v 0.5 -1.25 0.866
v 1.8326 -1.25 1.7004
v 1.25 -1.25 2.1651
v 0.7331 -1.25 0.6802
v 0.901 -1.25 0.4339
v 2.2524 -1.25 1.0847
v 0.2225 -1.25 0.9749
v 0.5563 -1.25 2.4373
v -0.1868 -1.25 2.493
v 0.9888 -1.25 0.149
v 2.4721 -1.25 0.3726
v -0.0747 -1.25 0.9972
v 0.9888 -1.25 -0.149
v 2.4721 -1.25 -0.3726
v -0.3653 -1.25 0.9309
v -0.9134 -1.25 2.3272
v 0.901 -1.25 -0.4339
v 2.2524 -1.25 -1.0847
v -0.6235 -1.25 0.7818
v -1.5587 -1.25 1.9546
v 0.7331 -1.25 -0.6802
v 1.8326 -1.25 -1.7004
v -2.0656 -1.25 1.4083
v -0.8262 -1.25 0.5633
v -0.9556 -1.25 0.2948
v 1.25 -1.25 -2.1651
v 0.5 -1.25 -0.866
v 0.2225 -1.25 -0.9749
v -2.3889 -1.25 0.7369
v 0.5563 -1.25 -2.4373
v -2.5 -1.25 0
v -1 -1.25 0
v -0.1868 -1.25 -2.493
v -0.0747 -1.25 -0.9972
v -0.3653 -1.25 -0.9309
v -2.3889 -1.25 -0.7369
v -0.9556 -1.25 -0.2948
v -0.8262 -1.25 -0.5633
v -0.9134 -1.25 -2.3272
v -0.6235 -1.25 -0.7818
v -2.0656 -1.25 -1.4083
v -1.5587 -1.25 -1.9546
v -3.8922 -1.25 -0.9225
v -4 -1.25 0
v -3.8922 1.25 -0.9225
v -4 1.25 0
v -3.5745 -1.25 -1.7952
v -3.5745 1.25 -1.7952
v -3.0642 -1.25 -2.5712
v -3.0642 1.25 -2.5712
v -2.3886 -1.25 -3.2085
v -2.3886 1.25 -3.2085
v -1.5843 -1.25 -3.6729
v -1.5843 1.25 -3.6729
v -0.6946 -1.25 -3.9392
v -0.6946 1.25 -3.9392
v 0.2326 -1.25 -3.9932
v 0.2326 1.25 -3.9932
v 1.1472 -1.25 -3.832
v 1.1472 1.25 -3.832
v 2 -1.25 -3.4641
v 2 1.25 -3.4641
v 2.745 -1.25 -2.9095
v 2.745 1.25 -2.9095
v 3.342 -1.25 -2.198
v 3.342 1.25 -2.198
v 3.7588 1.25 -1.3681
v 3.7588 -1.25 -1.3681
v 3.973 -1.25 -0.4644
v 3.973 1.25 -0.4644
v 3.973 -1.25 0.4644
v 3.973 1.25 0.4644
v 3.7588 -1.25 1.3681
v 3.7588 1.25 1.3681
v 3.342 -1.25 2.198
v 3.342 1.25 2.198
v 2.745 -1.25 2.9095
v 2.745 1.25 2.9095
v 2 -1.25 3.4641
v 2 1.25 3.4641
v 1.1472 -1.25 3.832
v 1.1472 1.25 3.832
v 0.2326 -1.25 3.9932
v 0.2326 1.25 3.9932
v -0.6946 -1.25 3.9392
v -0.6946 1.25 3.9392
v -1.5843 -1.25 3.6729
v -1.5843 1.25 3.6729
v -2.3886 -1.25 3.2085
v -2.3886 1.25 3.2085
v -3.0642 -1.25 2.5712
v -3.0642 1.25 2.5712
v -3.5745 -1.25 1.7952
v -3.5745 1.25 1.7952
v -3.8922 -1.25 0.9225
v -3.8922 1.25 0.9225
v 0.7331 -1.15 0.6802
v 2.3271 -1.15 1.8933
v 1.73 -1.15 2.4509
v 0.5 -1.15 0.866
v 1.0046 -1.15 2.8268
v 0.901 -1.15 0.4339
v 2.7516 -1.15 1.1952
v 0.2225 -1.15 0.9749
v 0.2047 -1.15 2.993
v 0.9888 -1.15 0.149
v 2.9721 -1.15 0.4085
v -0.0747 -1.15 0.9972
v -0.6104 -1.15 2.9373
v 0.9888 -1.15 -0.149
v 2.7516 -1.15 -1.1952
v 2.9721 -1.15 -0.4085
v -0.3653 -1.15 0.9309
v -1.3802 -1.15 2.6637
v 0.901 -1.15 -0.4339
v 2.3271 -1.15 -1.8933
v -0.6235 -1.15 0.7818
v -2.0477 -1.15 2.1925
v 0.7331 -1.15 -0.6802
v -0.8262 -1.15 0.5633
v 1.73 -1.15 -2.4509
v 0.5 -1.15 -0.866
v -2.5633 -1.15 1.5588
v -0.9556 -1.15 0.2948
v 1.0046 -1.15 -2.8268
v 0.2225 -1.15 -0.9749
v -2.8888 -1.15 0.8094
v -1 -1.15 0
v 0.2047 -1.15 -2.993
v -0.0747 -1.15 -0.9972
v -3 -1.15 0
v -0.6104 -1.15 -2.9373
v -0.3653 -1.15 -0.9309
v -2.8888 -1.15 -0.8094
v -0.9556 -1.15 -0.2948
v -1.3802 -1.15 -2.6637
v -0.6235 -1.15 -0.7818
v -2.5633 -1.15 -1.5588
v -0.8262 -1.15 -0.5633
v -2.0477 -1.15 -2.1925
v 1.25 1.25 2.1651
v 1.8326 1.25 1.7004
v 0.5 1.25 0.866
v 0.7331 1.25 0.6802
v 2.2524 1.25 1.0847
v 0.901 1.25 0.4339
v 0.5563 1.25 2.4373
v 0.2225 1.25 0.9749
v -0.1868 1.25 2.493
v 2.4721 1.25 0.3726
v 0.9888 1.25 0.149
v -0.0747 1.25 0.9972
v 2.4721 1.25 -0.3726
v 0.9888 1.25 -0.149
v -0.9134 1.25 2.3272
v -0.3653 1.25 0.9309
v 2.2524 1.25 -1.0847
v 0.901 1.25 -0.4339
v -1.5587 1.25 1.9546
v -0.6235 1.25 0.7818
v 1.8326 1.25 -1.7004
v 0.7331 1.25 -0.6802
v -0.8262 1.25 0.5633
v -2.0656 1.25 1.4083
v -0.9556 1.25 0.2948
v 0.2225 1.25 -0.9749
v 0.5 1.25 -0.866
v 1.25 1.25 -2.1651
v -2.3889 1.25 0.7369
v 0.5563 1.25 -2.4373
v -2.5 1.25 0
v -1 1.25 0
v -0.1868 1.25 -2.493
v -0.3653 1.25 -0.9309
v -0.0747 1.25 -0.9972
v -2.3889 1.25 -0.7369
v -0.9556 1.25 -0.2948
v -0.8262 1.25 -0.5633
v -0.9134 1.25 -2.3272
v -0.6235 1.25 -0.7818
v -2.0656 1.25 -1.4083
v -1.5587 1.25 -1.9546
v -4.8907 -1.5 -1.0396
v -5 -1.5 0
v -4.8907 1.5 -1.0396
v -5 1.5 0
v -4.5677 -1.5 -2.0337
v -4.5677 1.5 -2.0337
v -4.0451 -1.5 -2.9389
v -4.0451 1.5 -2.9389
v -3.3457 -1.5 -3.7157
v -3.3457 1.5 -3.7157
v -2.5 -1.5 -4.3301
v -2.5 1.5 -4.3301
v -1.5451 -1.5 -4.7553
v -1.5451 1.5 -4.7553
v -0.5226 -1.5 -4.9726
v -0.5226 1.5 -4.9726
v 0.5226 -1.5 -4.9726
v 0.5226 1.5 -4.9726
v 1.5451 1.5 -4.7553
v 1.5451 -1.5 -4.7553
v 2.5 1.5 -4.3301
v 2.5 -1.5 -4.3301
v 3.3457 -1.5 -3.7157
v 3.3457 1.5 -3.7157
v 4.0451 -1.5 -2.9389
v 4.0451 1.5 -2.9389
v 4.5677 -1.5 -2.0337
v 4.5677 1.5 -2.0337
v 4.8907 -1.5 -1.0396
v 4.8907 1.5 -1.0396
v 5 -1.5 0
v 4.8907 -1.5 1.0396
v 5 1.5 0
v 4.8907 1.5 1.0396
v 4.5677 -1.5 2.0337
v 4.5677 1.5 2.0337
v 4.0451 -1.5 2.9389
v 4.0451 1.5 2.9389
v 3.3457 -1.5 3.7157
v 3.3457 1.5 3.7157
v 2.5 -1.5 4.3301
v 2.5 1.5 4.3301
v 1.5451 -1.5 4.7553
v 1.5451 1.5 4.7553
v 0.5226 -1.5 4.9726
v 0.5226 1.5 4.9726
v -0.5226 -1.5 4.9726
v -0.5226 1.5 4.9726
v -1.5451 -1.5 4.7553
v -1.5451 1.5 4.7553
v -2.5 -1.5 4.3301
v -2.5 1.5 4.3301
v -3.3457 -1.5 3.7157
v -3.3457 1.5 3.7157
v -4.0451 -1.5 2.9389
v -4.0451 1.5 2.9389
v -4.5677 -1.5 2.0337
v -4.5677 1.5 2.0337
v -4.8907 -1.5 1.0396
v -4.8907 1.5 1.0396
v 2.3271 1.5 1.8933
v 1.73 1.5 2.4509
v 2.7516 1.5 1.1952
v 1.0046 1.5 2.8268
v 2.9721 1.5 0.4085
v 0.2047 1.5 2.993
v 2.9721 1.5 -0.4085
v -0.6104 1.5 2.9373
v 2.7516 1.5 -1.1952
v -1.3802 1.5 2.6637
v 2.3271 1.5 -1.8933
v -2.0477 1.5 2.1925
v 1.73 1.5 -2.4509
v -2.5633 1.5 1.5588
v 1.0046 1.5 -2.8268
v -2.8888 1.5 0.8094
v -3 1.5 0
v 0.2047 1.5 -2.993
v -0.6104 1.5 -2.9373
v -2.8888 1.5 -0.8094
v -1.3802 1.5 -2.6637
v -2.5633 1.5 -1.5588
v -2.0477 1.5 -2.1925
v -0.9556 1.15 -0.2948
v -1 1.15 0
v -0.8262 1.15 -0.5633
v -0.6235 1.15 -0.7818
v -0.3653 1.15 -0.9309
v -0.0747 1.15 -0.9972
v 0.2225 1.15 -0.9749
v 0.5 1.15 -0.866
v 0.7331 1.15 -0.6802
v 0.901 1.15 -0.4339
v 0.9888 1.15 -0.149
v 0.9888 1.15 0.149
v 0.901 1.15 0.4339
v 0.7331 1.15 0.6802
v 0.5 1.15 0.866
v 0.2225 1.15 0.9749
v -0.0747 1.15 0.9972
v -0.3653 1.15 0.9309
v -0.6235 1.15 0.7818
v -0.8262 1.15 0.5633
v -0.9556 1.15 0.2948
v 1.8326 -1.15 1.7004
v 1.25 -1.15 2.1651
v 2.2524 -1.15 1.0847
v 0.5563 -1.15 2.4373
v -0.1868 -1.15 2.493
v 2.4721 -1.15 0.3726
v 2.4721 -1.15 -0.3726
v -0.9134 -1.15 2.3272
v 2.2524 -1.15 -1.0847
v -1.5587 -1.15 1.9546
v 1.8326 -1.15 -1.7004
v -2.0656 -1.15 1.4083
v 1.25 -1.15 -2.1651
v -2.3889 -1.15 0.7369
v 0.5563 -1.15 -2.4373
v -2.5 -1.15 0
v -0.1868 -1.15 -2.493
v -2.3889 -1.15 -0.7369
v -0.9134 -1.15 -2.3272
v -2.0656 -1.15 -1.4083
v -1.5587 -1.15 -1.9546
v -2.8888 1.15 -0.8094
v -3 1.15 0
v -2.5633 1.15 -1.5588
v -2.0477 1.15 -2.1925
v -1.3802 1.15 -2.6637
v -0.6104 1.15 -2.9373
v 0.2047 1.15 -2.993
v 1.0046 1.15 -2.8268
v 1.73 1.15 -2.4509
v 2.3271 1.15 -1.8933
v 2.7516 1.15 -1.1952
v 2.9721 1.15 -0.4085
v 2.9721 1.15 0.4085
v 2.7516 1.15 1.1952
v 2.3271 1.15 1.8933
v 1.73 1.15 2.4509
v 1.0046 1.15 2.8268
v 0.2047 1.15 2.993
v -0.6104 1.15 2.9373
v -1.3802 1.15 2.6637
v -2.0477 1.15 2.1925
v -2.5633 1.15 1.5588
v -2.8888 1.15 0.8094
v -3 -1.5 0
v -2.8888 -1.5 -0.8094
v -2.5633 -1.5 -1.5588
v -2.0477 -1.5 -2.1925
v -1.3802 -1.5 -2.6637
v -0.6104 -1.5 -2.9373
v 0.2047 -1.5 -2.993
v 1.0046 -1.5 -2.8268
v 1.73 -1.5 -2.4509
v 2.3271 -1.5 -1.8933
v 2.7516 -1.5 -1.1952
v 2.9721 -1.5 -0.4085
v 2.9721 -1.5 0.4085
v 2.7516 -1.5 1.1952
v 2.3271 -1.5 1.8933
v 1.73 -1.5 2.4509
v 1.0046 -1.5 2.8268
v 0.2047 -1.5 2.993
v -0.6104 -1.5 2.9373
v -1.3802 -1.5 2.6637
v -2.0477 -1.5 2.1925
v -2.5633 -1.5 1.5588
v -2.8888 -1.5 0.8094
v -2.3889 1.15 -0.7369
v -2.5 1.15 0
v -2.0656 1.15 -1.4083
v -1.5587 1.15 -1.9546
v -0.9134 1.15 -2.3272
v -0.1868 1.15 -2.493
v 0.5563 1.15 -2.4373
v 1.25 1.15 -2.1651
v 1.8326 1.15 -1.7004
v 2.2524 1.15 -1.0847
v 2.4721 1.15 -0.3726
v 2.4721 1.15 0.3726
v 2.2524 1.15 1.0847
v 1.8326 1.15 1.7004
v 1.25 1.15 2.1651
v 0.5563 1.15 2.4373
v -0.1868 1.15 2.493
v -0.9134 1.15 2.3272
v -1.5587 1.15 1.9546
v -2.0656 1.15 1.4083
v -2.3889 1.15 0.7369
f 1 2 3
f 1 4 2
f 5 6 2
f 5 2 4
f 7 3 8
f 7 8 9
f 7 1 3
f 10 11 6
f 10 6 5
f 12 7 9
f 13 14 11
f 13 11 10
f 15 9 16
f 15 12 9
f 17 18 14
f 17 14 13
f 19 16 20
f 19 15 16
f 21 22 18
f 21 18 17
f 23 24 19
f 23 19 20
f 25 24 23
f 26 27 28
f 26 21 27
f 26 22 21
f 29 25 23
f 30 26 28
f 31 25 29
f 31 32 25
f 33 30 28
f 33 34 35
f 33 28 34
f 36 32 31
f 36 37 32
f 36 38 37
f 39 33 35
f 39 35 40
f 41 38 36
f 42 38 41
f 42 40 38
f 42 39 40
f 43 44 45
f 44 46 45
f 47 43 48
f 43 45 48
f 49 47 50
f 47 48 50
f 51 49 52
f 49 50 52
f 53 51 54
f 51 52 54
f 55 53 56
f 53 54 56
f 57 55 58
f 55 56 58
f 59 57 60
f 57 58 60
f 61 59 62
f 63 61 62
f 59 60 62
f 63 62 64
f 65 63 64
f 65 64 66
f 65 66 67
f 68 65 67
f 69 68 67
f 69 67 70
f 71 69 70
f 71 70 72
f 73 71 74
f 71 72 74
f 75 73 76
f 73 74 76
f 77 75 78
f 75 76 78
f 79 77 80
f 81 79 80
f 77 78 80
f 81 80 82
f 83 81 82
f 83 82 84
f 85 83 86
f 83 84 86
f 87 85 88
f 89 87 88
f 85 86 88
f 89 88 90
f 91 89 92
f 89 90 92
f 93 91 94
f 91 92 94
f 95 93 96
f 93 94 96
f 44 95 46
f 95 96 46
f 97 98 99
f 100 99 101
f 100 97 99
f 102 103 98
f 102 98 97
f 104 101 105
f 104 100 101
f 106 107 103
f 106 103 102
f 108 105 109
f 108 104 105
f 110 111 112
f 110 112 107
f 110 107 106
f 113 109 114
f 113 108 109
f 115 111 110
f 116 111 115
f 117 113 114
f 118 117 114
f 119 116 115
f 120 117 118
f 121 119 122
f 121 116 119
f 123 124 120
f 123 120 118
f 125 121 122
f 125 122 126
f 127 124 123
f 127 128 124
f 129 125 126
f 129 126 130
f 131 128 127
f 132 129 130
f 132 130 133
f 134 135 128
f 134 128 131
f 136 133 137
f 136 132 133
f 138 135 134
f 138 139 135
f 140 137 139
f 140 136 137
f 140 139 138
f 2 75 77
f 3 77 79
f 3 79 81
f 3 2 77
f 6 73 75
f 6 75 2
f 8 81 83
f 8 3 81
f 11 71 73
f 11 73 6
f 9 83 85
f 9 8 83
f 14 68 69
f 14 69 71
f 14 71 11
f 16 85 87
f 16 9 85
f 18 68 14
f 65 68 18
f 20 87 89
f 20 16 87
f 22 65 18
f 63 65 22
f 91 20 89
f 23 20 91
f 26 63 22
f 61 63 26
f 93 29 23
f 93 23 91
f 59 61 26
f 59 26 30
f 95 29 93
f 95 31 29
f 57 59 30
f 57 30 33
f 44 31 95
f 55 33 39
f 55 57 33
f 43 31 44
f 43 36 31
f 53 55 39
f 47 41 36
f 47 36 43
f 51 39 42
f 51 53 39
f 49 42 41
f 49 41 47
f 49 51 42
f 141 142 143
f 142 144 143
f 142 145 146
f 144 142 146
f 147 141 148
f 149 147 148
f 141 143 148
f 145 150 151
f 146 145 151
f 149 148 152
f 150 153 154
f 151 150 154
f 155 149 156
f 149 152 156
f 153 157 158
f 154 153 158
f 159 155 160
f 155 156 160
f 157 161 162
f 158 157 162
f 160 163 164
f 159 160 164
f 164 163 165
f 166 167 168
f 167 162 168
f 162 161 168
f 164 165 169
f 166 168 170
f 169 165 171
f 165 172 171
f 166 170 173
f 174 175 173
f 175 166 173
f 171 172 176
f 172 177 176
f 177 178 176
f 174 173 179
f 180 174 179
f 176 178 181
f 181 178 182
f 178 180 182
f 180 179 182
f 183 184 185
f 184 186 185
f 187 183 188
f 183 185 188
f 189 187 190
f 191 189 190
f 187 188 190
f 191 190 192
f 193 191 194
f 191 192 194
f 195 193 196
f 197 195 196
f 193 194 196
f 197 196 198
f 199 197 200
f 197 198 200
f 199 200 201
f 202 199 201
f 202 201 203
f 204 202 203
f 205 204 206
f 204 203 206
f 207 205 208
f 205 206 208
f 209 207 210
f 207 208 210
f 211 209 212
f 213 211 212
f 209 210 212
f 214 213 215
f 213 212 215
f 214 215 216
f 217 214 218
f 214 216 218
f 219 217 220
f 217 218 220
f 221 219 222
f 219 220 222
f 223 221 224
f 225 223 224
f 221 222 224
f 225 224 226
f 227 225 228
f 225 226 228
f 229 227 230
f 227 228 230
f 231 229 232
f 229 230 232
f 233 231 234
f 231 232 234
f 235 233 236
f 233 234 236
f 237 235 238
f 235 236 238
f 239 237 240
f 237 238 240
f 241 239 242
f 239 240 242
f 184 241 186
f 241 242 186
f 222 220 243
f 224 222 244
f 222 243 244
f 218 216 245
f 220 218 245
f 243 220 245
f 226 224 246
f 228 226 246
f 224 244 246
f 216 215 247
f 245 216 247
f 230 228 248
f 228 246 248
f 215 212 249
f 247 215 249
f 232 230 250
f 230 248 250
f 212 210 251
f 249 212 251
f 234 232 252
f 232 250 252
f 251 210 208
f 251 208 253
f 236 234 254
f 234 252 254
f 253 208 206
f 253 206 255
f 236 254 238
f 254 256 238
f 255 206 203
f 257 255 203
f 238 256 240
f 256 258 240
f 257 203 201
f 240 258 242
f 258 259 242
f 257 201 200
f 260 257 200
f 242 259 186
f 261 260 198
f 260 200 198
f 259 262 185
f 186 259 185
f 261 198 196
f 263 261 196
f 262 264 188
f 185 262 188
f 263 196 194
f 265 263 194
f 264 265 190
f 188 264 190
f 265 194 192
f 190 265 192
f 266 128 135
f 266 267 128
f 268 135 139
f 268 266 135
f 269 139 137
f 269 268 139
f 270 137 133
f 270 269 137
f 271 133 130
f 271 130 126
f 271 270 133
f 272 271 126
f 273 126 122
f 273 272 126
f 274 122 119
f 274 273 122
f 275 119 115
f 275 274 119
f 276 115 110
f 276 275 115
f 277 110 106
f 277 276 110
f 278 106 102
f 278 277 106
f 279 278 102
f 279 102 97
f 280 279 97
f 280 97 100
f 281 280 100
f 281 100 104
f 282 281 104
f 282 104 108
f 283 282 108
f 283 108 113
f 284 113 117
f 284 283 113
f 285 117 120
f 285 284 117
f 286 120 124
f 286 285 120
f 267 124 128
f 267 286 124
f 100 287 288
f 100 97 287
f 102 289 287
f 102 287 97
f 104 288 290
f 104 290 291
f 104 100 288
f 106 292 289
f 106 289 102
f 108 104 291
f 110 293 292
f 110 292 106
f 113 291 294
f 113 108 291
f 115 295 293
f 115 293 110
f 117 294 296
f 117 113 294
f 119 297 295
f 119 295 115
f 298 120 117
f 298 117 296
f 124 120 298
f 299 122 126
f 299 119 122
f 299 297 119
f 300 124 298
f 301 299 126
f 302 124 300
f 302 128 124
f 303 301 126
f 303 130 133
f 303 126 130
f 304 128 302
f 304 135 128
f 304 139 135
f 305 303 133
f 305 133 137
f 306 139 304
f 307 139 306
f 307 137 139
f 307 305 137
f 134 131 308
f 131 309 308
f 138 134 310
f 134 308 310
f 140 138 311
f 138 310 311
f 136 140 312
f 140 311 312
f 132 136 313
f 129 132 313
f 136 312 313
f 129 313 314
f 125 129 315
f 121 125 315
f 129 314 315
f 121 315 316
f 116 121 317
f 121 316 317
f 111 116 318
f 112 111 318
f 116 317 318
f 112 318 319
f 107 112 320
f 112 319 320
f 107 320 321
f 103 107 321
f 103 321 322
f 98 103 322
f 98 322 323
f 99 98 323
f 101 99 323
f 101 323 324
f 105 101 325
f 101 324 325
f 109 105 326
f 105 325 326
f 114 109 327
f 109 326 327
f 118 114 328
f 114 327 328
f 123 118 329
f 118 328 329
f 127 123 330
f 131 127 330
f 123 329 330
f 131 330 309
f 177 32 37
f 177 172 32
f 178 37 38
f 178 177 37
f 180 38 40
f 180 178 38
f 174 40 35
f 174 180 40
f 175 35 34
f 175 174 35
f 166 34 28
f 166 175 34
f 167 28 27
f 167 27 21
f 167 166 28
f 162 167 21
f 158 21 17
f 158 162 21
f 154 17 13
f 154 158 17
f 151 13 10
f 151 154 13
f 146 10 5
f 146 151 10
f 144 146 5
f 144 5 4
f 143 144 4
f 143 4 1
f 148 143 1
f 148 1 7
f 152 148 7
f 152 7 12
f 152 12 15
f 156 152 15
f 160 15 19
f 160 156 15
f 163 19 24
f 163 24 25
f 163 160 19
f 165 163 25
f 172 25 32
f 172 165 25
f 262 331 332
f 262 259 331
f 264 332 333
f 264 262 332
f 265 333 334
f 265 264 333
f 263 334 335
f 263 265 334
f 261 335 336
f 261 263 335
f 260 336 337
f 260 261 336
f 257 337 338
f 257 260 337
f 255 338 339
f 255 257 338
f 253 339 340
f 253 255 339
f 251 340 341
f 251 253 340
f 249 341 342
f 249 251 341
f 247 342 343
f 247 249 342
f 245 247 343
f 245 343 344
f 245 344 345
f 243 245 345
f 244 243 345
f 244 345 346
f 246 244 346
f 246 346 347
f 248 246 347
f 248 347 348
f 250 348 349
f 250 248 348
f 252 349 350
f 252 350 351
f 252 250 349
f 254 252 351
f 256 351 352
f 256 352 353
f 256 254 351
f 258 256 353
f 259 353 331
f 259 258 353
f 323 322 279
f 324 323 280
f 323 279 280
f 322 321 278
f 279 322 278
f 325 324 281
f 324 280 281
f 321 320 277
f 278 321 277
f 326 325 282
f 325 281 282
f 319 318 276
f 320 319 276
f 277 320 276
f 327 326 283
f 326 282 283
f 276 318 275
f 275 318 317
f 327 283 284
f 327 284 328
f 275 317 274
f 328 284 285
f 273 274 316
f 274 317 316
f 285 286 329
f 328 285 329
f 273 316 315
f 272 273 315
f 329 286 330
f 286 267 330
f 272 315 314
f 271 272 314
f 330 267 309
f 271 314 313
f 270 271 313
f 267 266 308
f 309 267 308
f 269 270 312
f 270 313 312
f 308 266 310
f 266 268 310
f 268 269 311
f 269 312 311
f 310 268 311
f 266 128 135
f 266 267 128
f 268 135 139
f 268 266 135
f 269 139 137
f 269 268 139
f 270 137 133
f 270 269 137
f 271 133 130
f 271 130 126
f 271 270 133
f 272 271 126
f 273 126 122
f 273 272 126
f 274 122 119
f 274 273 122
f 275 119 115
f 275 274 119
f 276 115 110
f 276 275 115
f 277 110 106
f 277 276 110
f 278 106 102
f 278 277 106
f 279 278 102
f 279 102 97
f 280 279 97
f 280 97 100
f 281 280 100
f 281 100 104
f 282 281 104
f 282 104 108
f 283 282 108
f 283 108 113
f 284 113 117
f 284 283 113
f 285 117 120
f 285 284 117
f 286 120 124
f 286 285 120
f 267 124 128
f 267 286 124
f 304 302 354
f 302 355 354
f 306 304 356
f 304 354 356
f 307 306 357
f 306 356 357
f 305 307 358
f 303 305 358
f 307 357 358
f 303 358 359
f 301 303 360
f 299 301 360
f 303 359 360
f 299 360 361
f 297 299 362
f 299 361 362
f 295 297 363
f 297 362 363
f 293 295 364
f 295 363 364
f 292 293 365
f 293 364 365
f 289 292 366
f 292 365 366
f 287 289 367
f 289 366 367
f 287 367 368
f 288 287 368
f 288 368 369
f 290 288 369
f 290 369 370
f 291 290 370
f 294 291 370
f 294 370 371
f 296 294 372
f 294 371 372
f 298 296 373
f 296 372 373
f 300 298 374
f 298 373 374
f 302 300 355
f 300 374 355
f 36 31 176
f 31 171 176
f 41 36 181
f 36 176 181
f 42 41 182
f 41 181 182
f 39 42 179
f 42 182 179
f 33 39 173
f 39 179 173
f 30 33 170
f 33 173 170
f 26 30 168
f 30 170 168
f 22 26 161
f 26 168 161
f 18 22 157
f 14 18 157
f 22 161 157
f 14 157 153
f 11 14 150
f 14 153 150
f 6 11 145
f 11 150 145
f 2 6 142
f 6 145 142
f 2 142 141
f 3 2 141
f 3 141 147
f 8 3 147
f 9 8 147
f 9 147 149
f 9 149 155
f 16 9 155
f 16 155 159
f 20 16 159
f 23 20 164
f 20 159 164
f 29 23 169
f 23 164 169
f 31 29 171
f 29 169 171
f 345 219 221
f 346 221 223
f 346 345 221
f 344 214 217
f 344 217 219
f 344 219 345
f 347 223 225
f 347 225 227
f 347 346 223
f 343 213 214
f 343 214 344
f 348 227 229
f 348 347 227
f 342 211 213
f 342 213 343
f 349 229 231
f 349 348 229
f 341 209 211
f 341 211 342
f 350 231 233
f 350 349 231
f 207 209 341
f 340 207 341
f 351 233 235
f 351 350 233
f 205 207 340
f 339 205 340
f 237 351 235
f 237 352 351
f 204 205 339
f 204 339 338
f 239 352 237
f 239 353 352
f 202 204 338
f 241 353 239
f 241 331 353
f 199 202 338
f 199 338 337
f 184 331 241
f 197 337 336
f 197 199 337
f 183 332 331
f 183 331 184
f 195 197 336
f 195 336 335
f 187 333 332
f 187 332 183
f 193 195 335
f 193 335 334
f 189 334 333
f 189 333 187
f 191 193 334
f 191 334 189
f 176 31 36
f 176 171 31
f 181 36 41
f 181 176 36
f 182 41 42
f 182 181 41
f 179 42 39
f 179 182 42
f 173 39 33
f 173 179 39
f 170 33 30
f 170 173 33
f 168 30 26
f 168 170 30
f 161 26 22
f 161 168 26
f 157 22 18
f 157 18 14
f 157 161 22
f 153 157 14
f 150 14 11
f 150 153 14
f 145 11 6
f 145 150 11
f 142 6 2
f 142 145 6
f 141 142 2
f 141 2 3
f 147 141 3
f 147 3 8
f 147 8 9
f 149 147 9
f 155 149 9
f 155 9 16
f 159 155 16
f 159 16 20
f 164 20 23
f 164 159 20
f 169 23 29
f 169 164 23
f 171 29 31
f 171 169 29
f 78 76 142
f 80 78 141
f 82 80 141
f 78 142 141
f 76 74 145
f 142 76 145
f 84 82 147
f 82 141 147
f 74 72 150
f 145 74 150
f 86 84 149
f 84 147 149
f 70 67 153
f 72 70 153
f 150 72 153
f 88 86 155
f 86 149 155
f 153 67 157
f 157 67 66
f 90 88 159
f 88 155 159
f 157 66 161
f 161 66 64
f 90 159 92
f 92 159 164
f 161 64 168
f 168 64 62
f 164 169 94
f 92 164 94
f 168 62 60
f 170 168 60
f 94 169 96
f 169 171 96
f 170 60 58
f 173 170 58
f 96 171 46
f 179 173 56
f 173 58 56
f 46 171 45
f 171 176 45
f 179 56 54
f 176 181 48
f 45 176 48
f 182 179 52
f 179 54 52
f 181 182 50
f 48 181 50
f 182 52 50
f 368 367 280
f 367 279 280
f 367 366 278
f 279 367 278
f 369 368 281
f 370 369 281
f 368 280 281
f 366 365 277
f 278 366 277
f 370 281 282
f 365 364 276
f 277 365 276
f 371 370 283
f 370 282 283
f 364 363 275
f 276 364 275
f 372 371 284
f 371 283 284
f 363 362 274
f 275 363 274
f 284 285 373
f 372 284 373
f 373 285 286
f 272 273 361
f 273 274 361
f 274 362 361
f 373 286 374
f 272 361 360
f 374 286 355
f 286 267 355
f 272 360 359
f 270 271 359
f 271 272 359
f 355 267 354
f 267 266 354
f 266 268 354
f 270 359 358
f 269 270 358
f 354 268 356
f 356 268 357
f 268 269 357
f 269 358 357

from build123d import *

# Parameters (mm, degrees)
F0_W = 2
F0_H = 3
F2_W = 1.5
F2_H = 2.5
F4_W = 1.5
F4_H = 2.5
F6_W = 1.5
F6_H = 2.3
F8_W = 2
F8_H = 2.3


with BuildPart() as f1:
    # F0 (on Top) → F1 (revolve)
    with BuildSketch(Plane.XY):
        with Locations((-4, 0)):
            Rectangle(F0_W, F0_H)
    revolve(axis=Axis((0, 0, 0), (0, -1, 0)))


with BuildPart() as f3:
    # F2 (on Top) → F3 (revolve)
    with BuildSketch(Plane.XY):
        with Locations((-3.25, 0)):
            Rectangle(F2_W, F2_H)
    revolve(axis=Axis((0, 0, 0), (0, -1, 0)))


with BuildPart() as f5:
    # F4 (on Top) → F5 (revolve)
    with BuildSketch(Plane.XY):
        with Locations((-1.75, 0)):
            Rectangle(F4_W, F4_H)
    revolve(axis=Axis((0, 0, 0), (0, -1, 0)))


with BuildPart() as f7:
    # F6 (on Top) → F7 (revolve)
    with BuildSketch(Plane.XY):
        with Locations((-1.75, 0)):
            Rectangle(F6_W, F6_H)
    revolve(axis=Axis((0, 0, 0), (0, -1, 0)))


with BuildPart() as f9:
    # F8 (on Top) → F9 (revolve)
    with BuildSketch(Plane.XY):
        with Locations((-2, 0)):
            Rectangle(F8_W, F8_H)
    revolve(axis=Axis((0, 0, 0), (0, -1, 0)))


solid = Compound([f1.part, f3.part, f5.part, f7.part, f9.part])
